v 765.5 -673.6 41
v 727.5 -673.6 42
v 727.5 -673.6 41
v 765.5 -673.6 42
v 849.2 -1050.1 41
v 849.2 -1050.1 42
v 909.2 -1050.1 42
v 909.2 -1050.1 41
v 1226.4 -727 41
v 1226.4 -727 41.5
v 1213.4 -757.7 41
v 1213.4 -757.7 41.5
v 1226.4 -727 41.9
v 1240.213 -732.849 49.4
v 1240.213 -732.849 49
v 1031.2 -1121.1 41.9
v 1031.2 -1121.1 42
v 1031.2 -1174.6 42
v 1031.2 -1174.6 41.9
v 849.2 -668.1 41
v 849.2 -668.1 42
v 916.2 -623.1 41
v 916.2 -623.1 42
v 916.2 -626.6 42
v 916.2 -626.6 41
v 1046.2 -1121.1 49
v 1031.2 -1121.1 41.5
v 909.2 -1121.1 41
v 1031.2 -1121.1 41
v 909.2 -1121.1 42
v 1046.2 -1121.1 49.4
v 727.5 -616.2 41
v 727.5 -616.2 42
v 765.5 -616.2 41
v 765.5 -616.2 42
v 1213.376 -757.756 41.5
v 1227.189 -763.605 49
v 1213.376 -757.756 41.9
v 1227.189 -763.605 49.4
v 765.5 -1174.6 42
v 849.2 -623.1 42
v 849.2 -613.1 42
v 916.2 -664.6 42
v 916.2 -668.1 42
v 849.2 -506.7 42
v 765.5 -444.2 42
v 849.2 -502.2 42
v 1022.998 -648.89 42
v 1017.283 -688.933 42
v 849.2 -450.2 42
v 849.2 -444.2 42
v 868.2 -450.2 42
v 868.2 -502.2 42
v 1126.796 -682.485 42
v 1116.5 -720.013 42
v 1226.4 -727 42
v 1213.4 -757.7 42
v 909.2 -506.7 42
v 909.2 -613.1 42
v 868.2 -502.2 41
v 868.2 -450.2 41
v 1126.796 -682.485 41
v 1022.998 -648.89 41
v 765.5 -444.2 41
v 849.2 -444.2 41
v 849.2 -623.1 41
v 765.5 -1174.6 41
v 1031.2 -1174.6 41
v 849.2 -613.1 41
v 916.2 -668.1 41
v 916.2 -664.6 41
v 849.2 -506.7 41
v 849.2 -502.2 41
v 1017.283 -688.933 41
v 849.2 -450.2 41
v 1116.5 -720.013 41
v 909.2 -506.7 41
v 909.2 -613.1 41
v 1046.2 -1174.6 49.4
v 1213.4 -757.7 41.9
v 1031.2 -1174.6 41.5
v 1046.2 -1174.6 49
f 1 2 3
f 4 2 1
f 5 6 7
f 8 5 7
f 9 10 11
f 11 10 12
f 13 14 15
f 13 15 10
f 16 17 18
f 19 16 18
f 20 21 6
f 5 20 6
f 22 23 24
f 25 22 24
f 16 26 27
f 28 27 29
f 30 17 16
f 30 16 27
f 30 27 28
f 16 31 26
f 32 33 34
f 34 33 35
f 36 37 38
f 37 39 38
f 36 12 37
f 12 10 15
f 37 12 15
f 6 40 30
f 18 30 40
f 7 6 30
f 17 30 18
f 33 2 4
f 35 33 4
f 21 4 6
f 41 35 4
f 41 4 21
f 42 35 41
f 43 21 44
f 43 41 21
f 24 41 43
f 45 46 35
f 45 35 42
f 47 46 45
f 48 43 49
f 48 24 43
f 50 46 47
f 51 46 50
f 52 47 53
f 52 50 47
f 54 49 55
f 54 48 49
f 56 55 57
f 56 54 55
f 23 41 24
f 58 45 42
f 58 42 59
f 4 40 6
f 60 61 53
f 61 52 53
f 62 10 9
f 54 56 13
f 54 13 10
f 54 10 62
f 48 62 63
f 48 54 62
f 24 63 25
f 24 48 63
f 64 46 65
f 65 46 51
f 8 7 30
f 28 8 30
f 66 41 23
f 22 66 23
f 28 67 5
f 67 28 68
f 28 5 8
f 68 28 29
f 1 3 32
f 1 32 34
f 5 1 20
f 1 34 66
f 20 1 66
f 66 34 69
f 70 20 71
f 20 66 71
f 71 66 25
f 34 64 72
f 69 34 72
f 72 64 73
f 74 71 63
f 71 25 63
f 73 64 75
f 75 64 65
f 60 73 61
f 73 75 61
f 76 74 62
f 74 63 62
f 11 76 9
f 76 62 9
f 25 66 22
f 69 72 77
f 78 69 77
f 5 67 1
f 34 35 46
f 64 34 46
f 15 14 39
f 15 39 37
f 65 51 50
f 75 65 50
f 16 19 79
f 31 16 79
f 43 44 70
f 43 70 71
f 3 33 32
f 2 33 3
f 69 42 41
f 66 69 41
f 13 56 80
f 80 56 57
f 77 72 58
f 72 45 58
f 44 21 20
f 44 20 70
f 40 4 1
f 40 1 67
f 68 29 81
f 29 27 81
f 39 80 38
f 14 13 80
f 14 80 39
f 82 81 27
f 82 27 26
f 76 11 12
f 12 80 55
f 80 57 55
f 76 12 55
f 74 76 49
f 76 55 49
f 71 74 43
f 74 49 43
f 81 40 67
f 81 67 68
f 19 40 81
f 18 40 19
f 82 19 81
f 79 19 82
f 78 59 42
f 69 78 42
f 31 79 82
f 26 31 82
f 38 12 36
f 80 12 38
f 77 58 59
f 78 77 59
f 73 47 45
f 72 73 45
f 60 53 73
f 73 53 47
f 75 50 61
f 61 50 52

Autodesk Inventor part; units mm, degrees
ref_plane "YZ Plane" through (0, 0, 0) normal (1, 0, 0) x (0, 1, 0)
ref_plane "工作平面1" through (0, 0, 42) normal (0, 0, 1) x (1, 0, 0)
sketch "草图1" plane through (0, 0, 42) normal (0, 0, 1) x (1, 0, 0)
  line L0 (0, 0) -> (60, 0)
  line L1 (60, 0) -> (60, -1169.8)
  line L2 (60, -1169.8) -> (0, -1169.8)
  line L3 (0, -1169.8) -> (0, 0)
  line L4 (0, -80.6) -> (60, -80.6)
  line L5 (0, -191.9) -> (60, -191.9)
  line L6 (0, -276.5) -> (60, -276.5)
  line L7 (0, -335.9) -> (60, -335.9)
  line L8 (0, -420.6) -> (60, -420.6)
  line L9 (0, -550.6) -> (60, -550.6)
  line L10 (0, -677.8) -> (60, -677.8)
  line L11 (0, -782.9) -> (60, -782.9)
  line L12 (0, -839.5) -> (60, -839.5)
  line L13 (0, -923.6) -> (60, -923.6)
  line L14 (0, -1007.7) -> (60, -1007.7)
  line L15 (0, -1091.2) -> (60, -1091.2)
  line L16 (60, 0) -> (118.4, 0)
  line L17 (118.4, 0) -> (118.4, -23.7)
  line L18 (118.4, -23.7) -> (83.4, -23.7)
  line L19 (83.4, -23.7) -> (83.4, -79.7)
  line L20 (83.4, -79.7) -> (118.4, -79.7)
  line L21 (118.4, -79.7) -> (118.4, -137.6)
  line L22 (118.4, -137.6) -> (83.4, -137.6)
  line L23 (83.4, -137.6) -> (83.4, -276.5)
  line L24 (83.4, -276.5) -> (142.9, -276.5)
  line L25 (142.9, -276.5) -> (142.9, -379.5)
  line L26 (83.4, -276.5) -> (83.4, -379.5)
  line L27 (83.4, -379.5) -> (142.9, -379.5)
  line L28 (142.9, -379.5) -> (142.9, -463)
  line L29 (142.9, -463) -> (83.4, -463)
  line L30 (83.4, -463) -> (83.4, -379.5)
  line L31 (142.9, -463) -> (142.9, -566.2)
  line L32 (142.9, -566.2) -> (83.4, -566.2)
  line L33 (83.4, -566.2) -> (83.4, -463)
  line L34 (142.9, -566.2) -> (146.7, -566.2)
  line L35 (146.7, -566.2) -> (146.7, -616.2)
  line L36 (146.7, -616.2) -> (192.5, -616.2)
  line L37 (192.5, -616.2) -> (192.5, -673.2)
  line L38 (192.5, -616.2) -> (342.5, -616.2)
  line L39 (342.5, -616.2) -> (342.5, -673.2)
  line L40 (342.5, -673.2) -> (143.4, -673.2)
  line L41 (143.4, -673.2) -> (83.4, -673.2)
  line L42 (83.4, -673.2) -> (83.4, -1092.3)
  line L43 (83.4, -1092.3) -> (143.4, -1092.3)
  line L44 (143.4, -1092.3) -> (143.4, -673.2)
  line L45 (83.4, -754.3) -> (143.4, -754.3)
  line L46 (143.4, -837.8) -> (83.4, -837.8)
  line L47 (83.4, -893.6) -> (143.4, -893.6)
  line L48 (143.4, -978.3) -> (83.4, -978.3)
  line L49 (60, -1169.8) -> (188.1, -1169.8)
  line L50 (188.1, -1169.8) -> (188.1, -1092.3)
  line L51 (188.1, -1092.3) -> (143.4, -1092.3)
  line L52 (83.4, -1092.3) -> (83.4, -1117.3)
  line L53 (83.4, -1117.3) -> (188.1, -1117.3)
  line L54 (98.6, -1092.3) -> (98.6, -1117.3)
  line L55 (114.5, -1092.3) -> (114.5, -1117.3)
  line L56 (143.4, -1092.3) -> (143.4, -1117.3)
  line L57 (166.2, -1092.3) -> (166.2, -1117.3)
  line L58 (188.1, -1163.6) -> (336, -1163.6)
  line L59 (188.1, -1137.1) -> (336, -1137.1)
  line L60 (336, -1137.1) -> (336, -1163.6)
  line L61 (342.5, -616.2) -> (398.5, -616.2)
  line L62 (342.5, -673.2) -> (393, -673.2)
  line L63 (393, -673.2) -> (393, -1136.7)
  line L64 (393, -1136.7) -> (393, -1141.7)
  line L65 (393, -1136.7) -> (336, -1137.1)
  line L66 (336, -1163.6) -> (393, -1163.6)
  line L67 (393, -1163.6) -> (393, -1158.6)
  line L68 (393, -1163.6) -> (393, -1188.1)
  line L69 (393, -1188.1) -> (417, -1188.1)
  line L70 (417, -1188.1) -> (542.5, -1188.1)
  line L71 (542.5, -1188.1) -> (542.5, -1127.7)
  line L72 (417, -1188.1) -> (417, -1127.7)
  line L73 (417, -1127.7) -> (542.5, -1127.7)
  line L74 (542.5, -1127.7) -> (542.5, -896.8)
  line L75 (542.5, -896.8) -> (542.5, -786.2)
  line L76 (542.5, -786.2) -> (542.5, -673.6)
  line L77 (542.5, -673.6) -> (393, -673.2)
  line L78 (417, -1127.7) -> (417, -896.8)
  line L79 (417, -896.8) -> (542.5, -896.8)
  line L80 (417, -896.8) -> (417.2959, -786.2)
  line L81 (417.2959, -786.2) -> (542.5, -786.2)
  line L82 (417.2959, -786.2) -> (417.5981, -673.2658)
  line L83 (398.5, -499.2) -> (398.5, -384.2)
  line L84 (398.5, -616.2) -> (398.5, -499.2)
  line L85 (398.5, -616.2) -> (458.5, -616.2)
  line L86 (458.5, -616.2) -> (458.5, -384.2)
  line L87 (458.5, -384.2) -> (398.5, -384.2)
  line L88 (398.5, -499.2) -> (458.5, -499.2)
  line L89 (398.5, -441.7) -> (458.5, -441.7)
  line L90 (458.5, -384.2) -> (458.5, -354.2)
  line L91 (458.5, -354.2) -> (482.5, -369.2)
  line L92 (482.5, -369.2) -> (482.5, -384.2)
  line L93 (482.5, -384.2) -> (542.5, -384.2)
  line L94 (542.5, -384.2) -> (542.5, -413.6)
  line L95 (542.5, -413.6) -> (542.5, -443.7)
  line L96 (542.5, -443.7) -> (542.5, -498.7)
  line L97 (542.5, -498.7) -> (542.5, -616.2)
  line L98 (542.5, -413.6) -> (501.5, -413.6)
  line L99 (542.5, -443.7) -> (482.5, -443.7)
  line L100 (542.5, -616.2) -> (482.5, -616.2)
  line L101 (542.5, -498.7) -> (482.5, -498.7)
  line L102 (482.5, -410.1) -> (501.5, -410.1)
  line L103 (501.5, -410.1) -> (501.5, -423.1)
  line L104 (501.5, -423.1) -> (482.5, -423.1)
  line L105 (482.5, -384.2) -> (482.5, -410.1)
  line L106 (482.5, -423.1) -> (482.5, -616.2)
  line L107 (542.5, -616.2) -> (727.5, -616.2)
  line L108 (727.5, -616.2) -> (727.5, -673.6)
  line L109 (727.5, -673.6) -> (542.5, -673.6)
  line L110 (578, -673.6) -> (578, -726.6)
  line L111 (578, -726.6) -> (605, -726.6)
  line L112 (605, -726.6) -> (605, -673.6)
  line L113 (727.5, -673.6) -> (727.5, -726.6)
  line L114 (727.5, -726.6) -> (700.5, -726.6)
  line L115 (700.5, -726.6) -> (700.5, -673.6)
  line L116 (442.5, -384.2) -> (442.5, -354.2)
  line L117 (442.5, -354.2) -> (458.5, -354.2)
  line L118 (398.5, -384.2) -> (384.5, -384.2)
  line L119 (384.5, -384.2) -> (384.5, -354.2)
  line L120 (384.5, -354.2) -> (400.5, -354.2)
  line L121 (400.5, -354.2) -> (400.5, -384.2)
  line L122 (727.5, -616.2) -> (765.5, -616.2)
  line L123 (765.5, -616.2) -> (825.5, -616.2)
  line L124 (765.5, -616.2) -> (765.5, -504.2)
  line L125 (765.5, -504.2) -> (765.5, -444.2)
  line L126 (765.5, -444.2) -> (825.5, -444.2)
  line L127 (825.5, -444.2) -> (825.5, -504.2)
  line L128 (825.5, -504.2) -> (825.5, -616.2)
  line L129 (825.5, -504.2) -> (765.5, -504.2)
  line L130 (825.5, -444.2) -> (849.2, -444.2)
  line L131 (849.2, -444.2) -> (849.2, -450.2)
  line L132 (849.2, -450.2) -> (868.2, -450.2)
  line L133 (868.2, -450.2) -> (868.2, -502.2)
  line L134 (868.2, -502.2) -> (849.2, -502.2)
  line L135 (849.2, -502.2) -> (849.2, -450.2)
  line L136 (849.2, -502.2) -> (849.2, -506.7)
  line L137 (849.2, -506.7) -> (909.2, -506.7)
  line L138 (909.2, -506.7) -> (909.2, -613.1)
  line L139 (909.2, -613.1) -> (849.2, -613.1)
  line L140 (849.2, -613.1) -> (849.2, -506.7)
  line L141 (727.5, -673.6) -> (765.5, -673.6)
  line L142 (765.5, -673.6) -> (765.5, -786.6)
  line L143 (765.5, -786.6) -> (825.5, -786.6)
  line L144 (825.5, -786.6) -> (825.5, -673.6)
  line L145 (825.5, -673.6) -> (765.5, -673.6)
  line L146 (765.5, -786.6) -> (765.5, -897.6)
  line L147 (765.5, -897.6) -> (825.5, -897.6)
  line L148 (825.5, -897.6) -> (825.5, -786.6)
  line L149 (765.5, -897.6) -> (765.5, -1008.6)
  line L150 (765.5, -1008.6) -> (825.5, -1008.6)
  line L151 (825.5, -1008.6) -> (825.5, -897.6)
  line L152 (765.5, -1008.6) -> (765.5, -1125.1)
  line L153 (765.5, -1125.1) -> (825.5, -1125.1)
  line L154 (825.5, -1125.1) -> (825.5, -1008.6)
  line L155 (765.5, -1125.1) -> (765.5, -1174.6)
  line L156 (765.5, -1174.6) -> (825.5, -1174.6)
  line L157 (825.5, -1174.6) -> (825.5, -1125.1)
  line L158 (825.5, -1174.6) -> (849.2, -1174.6)
  line L159 (849.2, -613.1) -> (849.2, -623.1)
  line L160 (849.2, -623.1) -> (916.2, -623.1)
  line L161 (916.2, -623.1) -> (916.2, -626.6)
  line L162 (849.2, -623.1) -> (849.2, -668.1)
  line L163 (849.2, -668.1) -> (916.2, -668.1)
  line L164 (916.2, -668.1) -> (916.2, -664.6)
  line L165 (849.2, -668.1) -> (849.2, -681.1)
  line L166 (849.2, -681.1) -> (849.2, -1050.1)
  line L167 (849.2, -1050.1) -> (909.2, -1050.1)
  line L168 (909.2, -1050.1) -> (909.2, -1091.6)
  line L169 (909.2, -1091.6) -> (909.2, -1121.1)
  line L170 (909.2, -1121.1) -> (849.2, -1121.1)
  line L171 (849.2, -1121.1) -> (849.2, -1050.1)
  line L172 (909.2, -1091.6) -> (849.2, -1091.6)
  line L173 (849.2, -1174.6) -> (849.2, -1121.1)
  line L174 (849.2, -1174.6) -> (1031.2, -1174.6)
  line L175 (1031.2, -1121.1) -> (909.2, -1121.1)
  line L176 (1031.2, -1121.1) -> (1031.2, -1174.6)
  line L177 (916.2, -626.6) -> (1226.4, -727) construction
  arc A0 (1226.4, -727) -> (916.2, -626.6) centre (761.993, -1632.4479) ccw
  line L178 (916.2, -664.6) -> (1213.4, -757.7) construction
  arc A1 (1213.4, -757.7) -> (916.2, -664.6) centre (605.6007, -2177.0365) ccw
  line L179 (1226.4, -727) -> (1213.4, -757.7)
  line L180 (1226.4, -727) -> (1239.7468, -733.8456)
  line L181 (1213.4, -757.7) -> (1226.7468, -764.5456)
  line L182 (1239.7468, -733.8456) -> (1237.0998, -739.0064)
  line L183 (1226.7468, -764.5456) -> (1229.3938, -759.3849)
  dimension "d1" = 60
  dimension "d2" = 80.6
  dimension "d3" = 111.3
  dimension "d4" = 84.6
  dimension "d5" = 59.4
  dimension "d6" = 84.7
  dimension "d7" = 130
  dimension "d8" = 127.2
  dimension "d9" = 105.1
  dimension "d10" = 56.6
  dimension "d11" = 84.1
  dimension "d12" = 84.1
  dimension "d13" = 83.5
  dimension "d14" = 78.6
  dimension "d15" = 58.4
  dimension "d16" = 23.7
  dimension "d17" = 35
  dimension "d18" = 56
  dimension "d19" = 57.9
  dimension "d20" = 35
  dimension "d21" = 138.9
  dimension "d22" = 59.5
  dimension "d23" = 103
  dimension "d24" = 83.5
  dimension "d25" = 103.2
  dimension "d26" = 59.5
  dimension "d27" = 3.8
  dimension "d28" = 50
  dimension "d29" = 45.8
  dimension "d30" = 57
  dimension "d31" = 150
  dimension "d32" = 57
  dimension "d33" = 199.1
  dimension "d34" = 60
  dimension "d36" = 81.1
  dimension "d37" = 83.5
  dimension "d38" = 55.8
  dimension "d39" = 84.7
  dimension "d40" = 114
  dimension "d41" = 128.1
  dimension "d42" = 25
  dimension "d43" = 15.2
  dimension "d44" = 15.9
  dimension "d45" = 28.9
  dimension "d46" = 22.8
  dimension "d47" = 21.9
  dimension "d48" = 147.9
  dimension "d49" = 6.2
  dimension "d50" = 26.5
  dimension "d51" = 56
  dimension "d52" = 50.5
  dimension "d53" = 463.5
  dimension "d54" = 5
  dimension "d55" = 5
  dimension "d56" = 24.5
  dimension "d57" = 24
  dimension "d58" = 125.5
  dimension "d59" = 60.4
  dimension "d60" = 230.9
  dimension "d61" = 110.6
  dimension "d62" = 112.6
  dimension "d64" = 117
  dimension "d65" = 115
  dimension "d66" = 60
extrude "拉伸1" add sketch "草图1" against normal blind 1 contours L108 L122 L123 L128 L127 L130 L131 L135 L136 L140 L159 L162 L165 L166 L171 L173 L158 L157 L154 L151 L148 L144 L145 L141 | L145 L144 L143 L142 | L124 L129 L128 L123 | L143 L148 L147 L146 | L125 L126 L127 L129 | L147 L151 L150 L149 | L150 L154 L153 L152 | L153 L157 L156 L155 | L132 L133 L134 L135 | L173 L170 L175 L176 L174 | L137 L138 L139 L140 | L171 L172 L169 L170 | L171 L167 L168 L172 | L160 L161 A0 L179 A1 L164 L163 L162
sketch "草图2" plane through (765.5, -1174.6, 42) normal (0, -1, 0) x (1, 0, 0)
  line L0 (265.7, 0) -> (265.7, -1) construction
  line L1 (265.7, -0.5) -> (280.7, 7)
  line L2 (265.7, -0.5) -> (265.7, -0.1)
  line L3 (265.7, -0.1) -> (280.7, 7.4)
  line L4 (280.7, 7.4) -> (280.7, 7)
  point P0 (-765.5, -42)
  dimension "d135" = 7.5
  dimension "d137" = 15
  dimension "d138" = 0.4
extrude "拉伸2" add sketch "草图2" against normal up to surface (53.5 mm away)
ref_plane "工作平面2" through (1226.4, -727, 42) normal (0.3899335, 0.920843, 0) x (-0.920843, 0.3899335, 0)
sketch "草图3" plane through (1226.4, -727, 42) normal (0.3899335, 0.920843, 0) x (-0.920843, 0.3899335, 0)
  line L0 (0, 0) -> (0, -1) construction
  line L1 (0, -0.5) -> (-15, 7)
  line L2 (0, -0.5) -> (0, -0.1)
  line L3 (0, -0.1) -> (-15, 7.4)
  line L4 (-15, 7.4) -> (-15, 7)
  point P0 (1412.8035, -42)
  dimension "d141" = 7.5
  dimension "d144" = 15
  dimension "d145" = 0.4
extrude "拉伸3" add sketch "草图3" against normal blind 33.4
properties part number "LabVIEWM0.5"
